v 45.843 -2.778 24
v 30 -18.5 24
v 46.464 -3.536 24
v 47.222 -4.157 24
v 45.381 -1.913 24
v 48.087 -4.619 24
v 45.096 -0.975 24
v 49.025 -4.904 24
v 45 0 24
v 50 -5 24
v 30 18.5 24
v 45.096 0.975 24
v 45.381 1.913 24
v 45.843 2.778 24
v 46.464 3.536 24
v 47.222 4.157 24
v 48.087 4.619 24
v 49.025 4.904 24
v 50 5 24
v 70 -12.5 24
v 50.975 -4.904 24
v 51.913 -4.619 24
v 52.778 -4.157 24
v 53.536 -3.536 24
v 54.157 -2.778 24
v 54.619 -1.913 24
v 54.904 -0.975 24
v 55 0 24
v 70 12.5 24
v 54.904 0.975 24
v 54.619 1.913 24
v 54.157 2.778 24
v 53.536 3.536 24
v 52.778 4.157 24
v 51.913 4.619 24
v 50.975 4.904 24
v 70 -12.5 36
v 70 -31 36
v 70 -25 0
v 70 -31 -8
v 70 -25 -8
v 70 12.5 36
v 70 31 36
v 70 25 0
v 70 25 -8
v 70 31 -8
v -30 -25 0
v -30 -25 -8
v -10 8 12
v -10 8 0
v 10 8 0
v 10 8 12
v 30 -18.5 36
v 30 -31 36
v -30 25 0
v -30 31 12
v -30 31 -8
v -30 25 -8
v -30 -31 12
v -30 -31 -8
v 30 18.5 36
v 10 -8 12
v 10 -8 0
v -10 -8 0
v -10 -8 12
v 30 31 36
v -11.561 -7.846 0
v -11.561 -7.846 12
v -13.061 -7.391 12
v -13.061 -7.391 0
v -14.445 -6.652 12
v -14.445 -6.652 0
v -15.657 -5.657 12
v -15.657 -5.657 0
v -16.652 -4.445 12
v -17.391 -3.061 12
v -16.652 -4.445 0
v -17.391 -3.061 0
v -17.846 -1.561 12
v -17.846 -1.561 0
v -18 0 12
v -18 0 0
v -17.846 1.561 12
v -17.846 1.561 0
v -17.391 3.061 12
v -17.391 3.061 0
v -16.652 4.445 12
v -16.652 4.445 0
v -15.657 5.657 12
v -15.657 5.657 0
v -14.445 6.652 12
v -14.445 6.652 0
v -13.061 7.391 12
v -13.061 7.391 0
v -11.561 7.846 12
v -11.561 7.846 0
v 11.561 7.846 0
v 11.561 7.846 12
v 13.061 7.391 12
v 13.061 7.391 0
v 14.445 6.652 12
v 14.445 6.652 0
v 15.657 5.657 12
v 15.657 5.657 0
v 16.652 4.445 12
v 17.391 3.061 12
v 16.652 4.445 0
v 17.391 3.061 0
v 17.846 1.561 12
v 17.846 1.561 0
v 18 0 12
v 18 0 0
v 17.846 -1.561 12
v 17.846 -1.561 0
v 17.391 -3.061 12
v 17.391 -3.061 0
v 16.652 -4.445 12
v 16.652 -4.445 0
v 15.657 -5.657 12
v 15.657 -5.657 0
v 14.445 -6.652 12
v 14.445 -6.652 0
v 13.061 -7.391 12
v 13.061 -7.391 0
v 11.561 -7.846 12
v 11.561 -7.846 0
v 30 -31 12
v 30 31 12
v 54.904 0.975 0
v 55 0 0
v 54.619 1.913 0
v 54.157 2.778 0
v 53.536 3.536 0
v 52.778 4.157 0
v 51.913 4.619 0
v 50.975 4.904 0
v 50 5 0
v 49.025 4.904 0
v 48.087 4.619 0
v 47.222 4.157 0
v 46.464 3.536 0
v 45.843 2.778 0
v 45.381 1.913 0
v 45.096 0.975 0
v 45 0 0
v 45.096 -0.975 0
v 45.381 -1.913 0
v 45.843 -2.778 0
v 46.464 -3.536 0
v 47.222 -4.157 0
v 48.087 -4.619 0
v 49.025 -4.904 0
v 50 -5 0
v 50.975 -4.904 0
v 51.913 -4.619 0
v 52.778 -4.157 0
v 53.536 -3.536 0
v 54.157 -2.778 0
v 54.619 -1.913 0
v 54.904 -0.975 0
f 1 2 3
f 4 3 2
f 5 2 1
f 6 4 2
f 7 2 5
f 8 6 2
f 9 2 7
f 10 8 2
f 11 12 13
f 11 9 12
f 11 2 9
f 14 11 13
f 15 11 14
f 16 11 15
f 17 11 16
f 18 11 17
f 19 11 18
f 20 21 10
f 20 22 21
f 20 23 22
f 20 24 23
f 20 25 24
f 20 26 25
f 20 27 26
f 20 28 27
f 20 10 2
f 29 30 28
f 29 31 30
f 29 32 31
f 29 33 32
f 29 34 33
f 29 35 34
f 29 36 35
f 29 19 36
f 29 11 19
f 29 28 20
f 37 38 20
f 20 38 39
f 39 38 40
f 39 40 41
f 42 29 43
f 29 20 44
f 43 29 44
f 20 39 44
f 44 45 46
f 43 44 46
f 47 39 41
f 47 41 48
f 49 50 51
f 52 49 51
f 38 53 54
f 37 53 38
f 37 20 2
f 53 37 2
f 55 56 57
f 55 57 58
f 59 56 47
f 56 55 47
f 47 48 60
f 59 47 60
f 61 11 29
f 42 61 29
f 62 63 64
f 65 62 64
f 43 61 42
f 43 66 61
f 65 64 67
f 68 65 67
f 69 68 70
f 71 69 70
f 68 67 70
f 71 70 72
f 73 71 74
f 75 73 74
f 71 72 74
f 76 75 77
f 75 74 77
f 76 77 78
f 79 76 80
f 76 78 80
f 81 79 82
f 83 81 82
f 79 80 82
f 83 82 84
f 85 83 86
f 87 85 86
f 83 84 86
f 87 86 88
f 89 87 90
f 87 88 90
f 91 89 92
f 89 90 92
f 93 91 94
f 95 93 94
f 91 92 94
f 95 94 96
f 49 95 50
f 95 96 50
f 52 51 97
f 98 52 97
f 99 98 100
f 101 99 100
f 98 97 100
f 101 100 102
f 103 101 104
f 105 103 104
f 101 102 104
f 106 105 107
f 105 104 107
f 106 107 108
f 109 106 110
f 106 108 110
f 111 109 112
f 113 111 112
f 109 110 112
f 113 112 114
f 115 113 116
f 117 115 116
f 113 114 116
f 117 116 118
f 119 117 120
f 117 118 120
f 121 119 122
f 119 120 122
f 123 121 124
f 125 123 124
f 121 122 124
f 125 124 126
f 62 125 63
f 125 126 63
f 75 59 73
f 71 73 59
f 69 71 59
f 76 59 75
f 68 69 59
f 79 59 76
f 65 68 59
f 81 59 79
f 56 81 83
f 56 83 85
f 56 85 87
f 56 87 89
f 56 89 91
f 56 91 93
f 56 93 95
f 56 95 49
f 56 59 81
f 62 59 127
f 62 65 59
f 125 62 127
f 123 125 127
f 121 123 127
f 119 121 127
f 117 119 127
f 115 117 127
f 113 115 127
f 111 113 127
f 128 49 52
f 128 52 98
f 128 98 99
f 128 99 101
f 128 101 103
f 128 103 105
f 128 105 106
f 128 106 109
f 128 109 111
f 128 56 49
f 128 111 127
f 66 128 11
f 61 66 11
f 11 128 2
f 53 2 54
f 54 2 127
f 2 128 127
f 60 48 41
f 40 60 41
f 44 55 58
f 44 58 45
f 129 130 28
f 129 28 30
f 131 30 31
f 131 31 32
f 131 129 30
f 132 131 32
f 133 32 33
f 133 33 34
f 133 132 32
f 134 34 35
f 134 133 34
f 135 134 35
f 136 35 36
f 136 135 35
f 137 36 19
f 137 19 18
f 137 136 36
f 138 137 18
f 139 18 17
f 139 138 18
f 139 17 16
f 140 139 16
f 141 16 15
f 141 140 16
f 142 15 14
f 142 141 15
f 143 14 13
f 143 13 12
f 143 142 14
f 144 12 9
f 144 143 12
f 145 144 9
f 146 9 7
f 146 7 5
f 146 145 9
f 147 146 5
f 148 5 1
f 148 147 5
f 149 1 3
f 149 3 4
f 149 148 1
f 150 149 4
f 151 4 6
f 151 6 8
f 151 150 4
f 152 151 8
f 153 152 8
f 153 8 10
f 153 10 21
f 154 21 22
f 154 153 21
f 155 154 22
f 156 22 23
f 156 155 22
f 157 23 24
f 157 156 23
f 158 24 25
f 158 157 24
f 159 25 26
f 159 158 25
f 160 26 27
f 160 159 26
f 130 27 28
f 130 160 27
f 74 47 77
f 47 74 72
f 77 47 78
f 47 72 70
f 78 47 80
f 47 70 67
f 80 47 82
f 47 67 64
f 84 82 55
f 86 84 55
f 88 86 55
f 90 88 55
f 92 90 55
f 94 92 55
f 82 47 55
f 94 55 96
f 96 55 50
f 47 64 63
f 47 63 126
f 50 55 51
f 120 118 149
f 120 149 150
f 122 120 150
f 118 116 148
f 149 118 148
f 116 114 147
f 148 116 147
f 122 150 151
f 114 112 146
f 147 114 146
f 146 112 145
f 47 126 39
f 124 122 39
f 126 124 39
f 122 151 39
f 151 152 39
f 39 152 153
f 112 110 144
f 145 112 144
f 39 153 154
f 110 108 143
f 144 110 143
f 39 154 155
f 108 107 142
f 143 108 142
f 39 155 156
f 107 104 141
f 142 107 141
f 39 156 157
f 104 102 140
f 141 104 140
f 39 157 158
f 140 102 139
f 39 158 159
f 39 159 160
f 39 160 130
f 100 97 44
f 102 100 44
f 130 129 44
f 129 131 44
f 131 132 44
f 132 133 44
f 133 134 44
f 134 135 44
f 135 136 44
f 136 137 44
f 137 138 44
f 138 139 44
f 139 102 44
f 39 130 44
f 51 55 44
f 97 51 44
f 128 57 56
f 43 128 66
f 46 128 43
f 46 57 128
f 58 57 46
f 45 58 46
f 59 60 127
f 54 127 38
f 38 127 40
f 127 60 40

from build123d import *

# Parameters (mm, degrees)
F0_W     = 60
F0_H     = 6
F0_W_2   = 40
F1_DEPTH = 8
F2_DEPTH = 12
F0_R     = 5
F3_DEPTH = 24
F4_DEPTH = 36


with BuildPart() as f1:
    # F0 (on Top) → F1 (new body)
    with BuildSketch(Plane.XY):
        with Locations((0, -28)):
            Rectangle(F0_W, F0_H)
        with Locations((50, -28)):
            Rectangle(F0_W_2, F0_H)
        with Locations((0, 28)):
            Rectangle(F0_W, F0_H)
        with Locations((50, 28)):
            Rectangle(F0_W_2, F0_H)
    extrude(amount=-F1_DEPTH)

    # F0 (on Top) → F2 (join)
    with BuildSketch(Plane.XY):
        with Locations((0, 28)):
            Rectangle(F0_W, F0_H)
        Polygon((30, 25), (-30, 25), (-30, -25), (30, -25), (30, -18.5), (30, 18.5), align=None)
        with BuildLine():
            ThreePointArc((-10, -8), (-18, 0), (-10, 8))
            Line((-10, 8), (10, 8))
            ThreePointArc((10, 8), (18, 0), (10, -8))
            Line((10, -8), (-10, -8))
        make_face(mode=Mode.SUBTRACT)
        with Locations((0, -28)):
            Rectangle(F0_W, F0_H)
    extrude(amount=F2_DEPTH)

    # F0 (on Top) → F3 (join)
    with BuildSketch(Plane.XY):
        with Locations((50, 28)):
            Rectangle(F0_W_2, F0_H)
        Polygon((70, 25), (30, 25), (30, 18.5), (70, 12.5), align=None)
        Polygon((70, 12.5), (30, 18.5), (30, -18.5), (70, -12.5), align=None)
        with Locations((50, 0)):
            Circle(F0_R, mode=Mode.SUBTRACT)
        Polygon((30, -18.5), (30, -25), (70, -25), (70, -12.5), align=None)
        with Locations((50, -28)):
            Rectangle(F0_W_2, F0_H)
    extrude(amount=F3_DEPTH)

    # F0 (on Top) → F4 (join)
    with BuildSketch(Plane.XY):
        Polygon((30, -18.5), (30, -25), (70, -25), (70, -12.5), align=None)
        with Locations((50, -28)):
            Rectangle(F0_W_2, F0_H)
        Polygon((70, 25), (30, 25), (30, 18.5), (70, 12.5), align=None)
        with Locations((50, 28)):
            Rectangle(F0_W_2, F0_H)
    extrude(amount=F4_DEPTH)


solid = f1.part
